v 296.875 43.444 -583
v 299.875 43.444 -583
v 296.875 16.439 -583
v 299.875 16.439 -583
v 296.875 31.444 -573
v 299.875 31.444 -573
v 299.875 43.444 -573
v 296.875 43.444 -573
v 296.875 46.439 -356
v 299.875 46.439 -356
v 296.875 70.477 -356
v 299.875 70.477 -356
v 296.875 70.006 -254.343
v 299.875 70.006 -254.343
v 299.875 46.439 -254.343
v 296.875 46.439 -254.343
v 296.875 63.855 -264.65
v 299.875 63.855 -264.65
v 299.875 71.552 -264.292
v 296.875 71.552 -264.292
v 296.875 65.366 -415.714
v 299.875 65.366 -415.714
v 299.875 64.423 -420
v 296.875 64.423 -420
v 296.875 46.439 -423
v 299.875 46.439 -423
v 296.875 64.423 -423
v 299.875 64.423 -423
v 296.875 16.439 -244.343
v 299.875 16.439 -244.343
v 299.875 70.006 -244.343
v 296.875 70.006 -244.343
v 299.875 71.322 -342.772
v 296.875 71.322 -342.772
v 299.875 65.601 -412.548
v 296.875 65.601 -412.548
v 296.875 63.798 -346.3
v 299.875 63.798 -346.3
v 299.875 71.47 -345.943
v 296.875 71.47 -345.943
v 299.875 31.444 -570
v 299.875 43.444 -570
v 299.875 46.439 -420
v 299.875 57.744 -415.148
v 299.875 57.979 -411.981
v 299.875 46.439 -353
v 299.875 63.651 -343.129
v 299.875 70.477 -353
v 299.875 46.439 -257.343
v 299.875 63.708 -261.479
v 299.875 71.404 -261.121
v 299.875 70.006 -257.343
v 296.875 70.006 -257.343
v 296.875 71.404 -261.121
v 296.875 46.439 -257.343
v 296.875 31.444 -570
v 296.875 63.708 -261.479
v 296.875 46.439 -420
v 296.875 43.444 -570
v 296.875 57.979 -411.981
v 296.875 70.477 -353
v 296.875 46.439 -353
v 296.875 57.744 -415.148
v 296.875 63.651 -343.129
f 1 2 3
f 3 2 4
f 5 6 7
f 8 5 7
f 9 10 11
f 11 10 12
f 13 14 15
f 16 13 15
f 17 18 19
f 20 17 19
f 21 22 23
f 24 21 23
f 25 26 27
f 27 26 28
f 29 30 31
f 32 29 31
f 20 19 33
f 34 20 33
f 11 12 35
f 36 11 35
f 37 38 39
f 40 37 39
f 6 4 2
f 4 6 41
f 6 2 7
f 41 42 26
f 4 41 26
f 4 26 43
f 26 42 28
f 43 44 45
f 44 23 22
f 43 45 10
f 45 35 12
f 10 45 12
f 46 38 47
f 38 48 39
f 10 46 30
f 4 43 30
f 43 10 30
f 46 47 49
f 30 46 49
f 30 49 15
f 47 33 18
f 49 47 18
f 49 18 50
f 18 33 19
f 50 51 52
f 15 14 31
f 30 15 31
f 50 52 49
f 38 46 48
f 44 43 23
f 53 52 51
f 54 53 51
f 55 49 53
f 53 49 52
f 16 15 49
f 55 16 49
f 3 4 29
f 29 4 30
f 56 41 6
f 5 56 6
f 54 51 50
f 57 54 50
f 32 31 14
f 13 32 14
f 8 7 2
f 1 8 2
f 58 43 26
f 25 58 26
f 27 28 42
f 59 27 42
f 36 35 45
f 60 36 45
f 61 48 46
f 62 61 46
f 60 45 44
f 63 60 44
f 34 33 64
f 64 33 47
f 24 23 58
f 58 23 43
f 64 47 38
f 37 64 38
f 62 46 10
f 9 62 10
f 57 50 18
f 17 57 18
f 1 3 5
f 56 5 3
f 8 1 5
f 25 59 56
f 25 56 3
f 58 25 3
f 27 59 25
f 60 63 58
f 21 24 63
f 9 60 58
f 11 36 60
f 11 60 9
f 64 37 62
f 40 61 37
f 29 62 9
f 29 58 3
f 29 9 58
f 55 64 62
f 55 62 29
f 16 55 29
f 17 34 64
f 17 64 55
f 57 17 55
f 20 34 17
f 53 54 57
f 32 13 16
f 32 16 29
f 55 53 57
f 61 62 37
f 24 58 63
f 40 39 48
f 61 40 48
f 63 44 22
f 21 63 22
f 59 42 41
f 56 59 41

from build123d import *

# Parameters (mm, degrees)
BOSS_EXTRUDE1_DEPTH = 3


with BuildPart() as part:
    # Sketch1 → Boss-Extrude1 (new body)
    with BuildSketch(Plane(origin=(299.875, 0, 0), x_dir=(0, 0, -1), z_dir=(1, 0, 0))):
        Polygon((254.342966202, 46.438825445), (257.342966202, 46.438825445), (257.342966202, 70.005768865), (261.120760322, 71.404391483), (261.478925383, 63.707591635), (264.650493907, 63.855165721), (264.292328864, 71.551965185), (342.771929635, 71.321990196), (343.128897762, 63.650911904), (346.300465699, 63.798498596), (345.943497573, 71.469576862), (353, 70.477223834), (353, 46.438825445), (356, 46.438825445), (356, 70.477223834), (412.547538785, 65.600801419), (411.981466053, 57.979089008), (415.147745162, 57.743926072), (415.71381799, 65.36563978), (420, 64.4233549), (420, 46.438825445), (423, 46.438825445), (423, 64.4233549), (570, 43.443621916), (570, 31.443621916), (573, 31.443621916), (573, 43.443621916), (583, 43.443621916), (583, 16.438825445), (244.342966202, 16.438825445), (244.342966202, 70.005768865), (254.342966202, 70.005768865), align=None)
    extrude(amount=-BOSS_EXTRUDE1_DEPTH)


solid = part.part
